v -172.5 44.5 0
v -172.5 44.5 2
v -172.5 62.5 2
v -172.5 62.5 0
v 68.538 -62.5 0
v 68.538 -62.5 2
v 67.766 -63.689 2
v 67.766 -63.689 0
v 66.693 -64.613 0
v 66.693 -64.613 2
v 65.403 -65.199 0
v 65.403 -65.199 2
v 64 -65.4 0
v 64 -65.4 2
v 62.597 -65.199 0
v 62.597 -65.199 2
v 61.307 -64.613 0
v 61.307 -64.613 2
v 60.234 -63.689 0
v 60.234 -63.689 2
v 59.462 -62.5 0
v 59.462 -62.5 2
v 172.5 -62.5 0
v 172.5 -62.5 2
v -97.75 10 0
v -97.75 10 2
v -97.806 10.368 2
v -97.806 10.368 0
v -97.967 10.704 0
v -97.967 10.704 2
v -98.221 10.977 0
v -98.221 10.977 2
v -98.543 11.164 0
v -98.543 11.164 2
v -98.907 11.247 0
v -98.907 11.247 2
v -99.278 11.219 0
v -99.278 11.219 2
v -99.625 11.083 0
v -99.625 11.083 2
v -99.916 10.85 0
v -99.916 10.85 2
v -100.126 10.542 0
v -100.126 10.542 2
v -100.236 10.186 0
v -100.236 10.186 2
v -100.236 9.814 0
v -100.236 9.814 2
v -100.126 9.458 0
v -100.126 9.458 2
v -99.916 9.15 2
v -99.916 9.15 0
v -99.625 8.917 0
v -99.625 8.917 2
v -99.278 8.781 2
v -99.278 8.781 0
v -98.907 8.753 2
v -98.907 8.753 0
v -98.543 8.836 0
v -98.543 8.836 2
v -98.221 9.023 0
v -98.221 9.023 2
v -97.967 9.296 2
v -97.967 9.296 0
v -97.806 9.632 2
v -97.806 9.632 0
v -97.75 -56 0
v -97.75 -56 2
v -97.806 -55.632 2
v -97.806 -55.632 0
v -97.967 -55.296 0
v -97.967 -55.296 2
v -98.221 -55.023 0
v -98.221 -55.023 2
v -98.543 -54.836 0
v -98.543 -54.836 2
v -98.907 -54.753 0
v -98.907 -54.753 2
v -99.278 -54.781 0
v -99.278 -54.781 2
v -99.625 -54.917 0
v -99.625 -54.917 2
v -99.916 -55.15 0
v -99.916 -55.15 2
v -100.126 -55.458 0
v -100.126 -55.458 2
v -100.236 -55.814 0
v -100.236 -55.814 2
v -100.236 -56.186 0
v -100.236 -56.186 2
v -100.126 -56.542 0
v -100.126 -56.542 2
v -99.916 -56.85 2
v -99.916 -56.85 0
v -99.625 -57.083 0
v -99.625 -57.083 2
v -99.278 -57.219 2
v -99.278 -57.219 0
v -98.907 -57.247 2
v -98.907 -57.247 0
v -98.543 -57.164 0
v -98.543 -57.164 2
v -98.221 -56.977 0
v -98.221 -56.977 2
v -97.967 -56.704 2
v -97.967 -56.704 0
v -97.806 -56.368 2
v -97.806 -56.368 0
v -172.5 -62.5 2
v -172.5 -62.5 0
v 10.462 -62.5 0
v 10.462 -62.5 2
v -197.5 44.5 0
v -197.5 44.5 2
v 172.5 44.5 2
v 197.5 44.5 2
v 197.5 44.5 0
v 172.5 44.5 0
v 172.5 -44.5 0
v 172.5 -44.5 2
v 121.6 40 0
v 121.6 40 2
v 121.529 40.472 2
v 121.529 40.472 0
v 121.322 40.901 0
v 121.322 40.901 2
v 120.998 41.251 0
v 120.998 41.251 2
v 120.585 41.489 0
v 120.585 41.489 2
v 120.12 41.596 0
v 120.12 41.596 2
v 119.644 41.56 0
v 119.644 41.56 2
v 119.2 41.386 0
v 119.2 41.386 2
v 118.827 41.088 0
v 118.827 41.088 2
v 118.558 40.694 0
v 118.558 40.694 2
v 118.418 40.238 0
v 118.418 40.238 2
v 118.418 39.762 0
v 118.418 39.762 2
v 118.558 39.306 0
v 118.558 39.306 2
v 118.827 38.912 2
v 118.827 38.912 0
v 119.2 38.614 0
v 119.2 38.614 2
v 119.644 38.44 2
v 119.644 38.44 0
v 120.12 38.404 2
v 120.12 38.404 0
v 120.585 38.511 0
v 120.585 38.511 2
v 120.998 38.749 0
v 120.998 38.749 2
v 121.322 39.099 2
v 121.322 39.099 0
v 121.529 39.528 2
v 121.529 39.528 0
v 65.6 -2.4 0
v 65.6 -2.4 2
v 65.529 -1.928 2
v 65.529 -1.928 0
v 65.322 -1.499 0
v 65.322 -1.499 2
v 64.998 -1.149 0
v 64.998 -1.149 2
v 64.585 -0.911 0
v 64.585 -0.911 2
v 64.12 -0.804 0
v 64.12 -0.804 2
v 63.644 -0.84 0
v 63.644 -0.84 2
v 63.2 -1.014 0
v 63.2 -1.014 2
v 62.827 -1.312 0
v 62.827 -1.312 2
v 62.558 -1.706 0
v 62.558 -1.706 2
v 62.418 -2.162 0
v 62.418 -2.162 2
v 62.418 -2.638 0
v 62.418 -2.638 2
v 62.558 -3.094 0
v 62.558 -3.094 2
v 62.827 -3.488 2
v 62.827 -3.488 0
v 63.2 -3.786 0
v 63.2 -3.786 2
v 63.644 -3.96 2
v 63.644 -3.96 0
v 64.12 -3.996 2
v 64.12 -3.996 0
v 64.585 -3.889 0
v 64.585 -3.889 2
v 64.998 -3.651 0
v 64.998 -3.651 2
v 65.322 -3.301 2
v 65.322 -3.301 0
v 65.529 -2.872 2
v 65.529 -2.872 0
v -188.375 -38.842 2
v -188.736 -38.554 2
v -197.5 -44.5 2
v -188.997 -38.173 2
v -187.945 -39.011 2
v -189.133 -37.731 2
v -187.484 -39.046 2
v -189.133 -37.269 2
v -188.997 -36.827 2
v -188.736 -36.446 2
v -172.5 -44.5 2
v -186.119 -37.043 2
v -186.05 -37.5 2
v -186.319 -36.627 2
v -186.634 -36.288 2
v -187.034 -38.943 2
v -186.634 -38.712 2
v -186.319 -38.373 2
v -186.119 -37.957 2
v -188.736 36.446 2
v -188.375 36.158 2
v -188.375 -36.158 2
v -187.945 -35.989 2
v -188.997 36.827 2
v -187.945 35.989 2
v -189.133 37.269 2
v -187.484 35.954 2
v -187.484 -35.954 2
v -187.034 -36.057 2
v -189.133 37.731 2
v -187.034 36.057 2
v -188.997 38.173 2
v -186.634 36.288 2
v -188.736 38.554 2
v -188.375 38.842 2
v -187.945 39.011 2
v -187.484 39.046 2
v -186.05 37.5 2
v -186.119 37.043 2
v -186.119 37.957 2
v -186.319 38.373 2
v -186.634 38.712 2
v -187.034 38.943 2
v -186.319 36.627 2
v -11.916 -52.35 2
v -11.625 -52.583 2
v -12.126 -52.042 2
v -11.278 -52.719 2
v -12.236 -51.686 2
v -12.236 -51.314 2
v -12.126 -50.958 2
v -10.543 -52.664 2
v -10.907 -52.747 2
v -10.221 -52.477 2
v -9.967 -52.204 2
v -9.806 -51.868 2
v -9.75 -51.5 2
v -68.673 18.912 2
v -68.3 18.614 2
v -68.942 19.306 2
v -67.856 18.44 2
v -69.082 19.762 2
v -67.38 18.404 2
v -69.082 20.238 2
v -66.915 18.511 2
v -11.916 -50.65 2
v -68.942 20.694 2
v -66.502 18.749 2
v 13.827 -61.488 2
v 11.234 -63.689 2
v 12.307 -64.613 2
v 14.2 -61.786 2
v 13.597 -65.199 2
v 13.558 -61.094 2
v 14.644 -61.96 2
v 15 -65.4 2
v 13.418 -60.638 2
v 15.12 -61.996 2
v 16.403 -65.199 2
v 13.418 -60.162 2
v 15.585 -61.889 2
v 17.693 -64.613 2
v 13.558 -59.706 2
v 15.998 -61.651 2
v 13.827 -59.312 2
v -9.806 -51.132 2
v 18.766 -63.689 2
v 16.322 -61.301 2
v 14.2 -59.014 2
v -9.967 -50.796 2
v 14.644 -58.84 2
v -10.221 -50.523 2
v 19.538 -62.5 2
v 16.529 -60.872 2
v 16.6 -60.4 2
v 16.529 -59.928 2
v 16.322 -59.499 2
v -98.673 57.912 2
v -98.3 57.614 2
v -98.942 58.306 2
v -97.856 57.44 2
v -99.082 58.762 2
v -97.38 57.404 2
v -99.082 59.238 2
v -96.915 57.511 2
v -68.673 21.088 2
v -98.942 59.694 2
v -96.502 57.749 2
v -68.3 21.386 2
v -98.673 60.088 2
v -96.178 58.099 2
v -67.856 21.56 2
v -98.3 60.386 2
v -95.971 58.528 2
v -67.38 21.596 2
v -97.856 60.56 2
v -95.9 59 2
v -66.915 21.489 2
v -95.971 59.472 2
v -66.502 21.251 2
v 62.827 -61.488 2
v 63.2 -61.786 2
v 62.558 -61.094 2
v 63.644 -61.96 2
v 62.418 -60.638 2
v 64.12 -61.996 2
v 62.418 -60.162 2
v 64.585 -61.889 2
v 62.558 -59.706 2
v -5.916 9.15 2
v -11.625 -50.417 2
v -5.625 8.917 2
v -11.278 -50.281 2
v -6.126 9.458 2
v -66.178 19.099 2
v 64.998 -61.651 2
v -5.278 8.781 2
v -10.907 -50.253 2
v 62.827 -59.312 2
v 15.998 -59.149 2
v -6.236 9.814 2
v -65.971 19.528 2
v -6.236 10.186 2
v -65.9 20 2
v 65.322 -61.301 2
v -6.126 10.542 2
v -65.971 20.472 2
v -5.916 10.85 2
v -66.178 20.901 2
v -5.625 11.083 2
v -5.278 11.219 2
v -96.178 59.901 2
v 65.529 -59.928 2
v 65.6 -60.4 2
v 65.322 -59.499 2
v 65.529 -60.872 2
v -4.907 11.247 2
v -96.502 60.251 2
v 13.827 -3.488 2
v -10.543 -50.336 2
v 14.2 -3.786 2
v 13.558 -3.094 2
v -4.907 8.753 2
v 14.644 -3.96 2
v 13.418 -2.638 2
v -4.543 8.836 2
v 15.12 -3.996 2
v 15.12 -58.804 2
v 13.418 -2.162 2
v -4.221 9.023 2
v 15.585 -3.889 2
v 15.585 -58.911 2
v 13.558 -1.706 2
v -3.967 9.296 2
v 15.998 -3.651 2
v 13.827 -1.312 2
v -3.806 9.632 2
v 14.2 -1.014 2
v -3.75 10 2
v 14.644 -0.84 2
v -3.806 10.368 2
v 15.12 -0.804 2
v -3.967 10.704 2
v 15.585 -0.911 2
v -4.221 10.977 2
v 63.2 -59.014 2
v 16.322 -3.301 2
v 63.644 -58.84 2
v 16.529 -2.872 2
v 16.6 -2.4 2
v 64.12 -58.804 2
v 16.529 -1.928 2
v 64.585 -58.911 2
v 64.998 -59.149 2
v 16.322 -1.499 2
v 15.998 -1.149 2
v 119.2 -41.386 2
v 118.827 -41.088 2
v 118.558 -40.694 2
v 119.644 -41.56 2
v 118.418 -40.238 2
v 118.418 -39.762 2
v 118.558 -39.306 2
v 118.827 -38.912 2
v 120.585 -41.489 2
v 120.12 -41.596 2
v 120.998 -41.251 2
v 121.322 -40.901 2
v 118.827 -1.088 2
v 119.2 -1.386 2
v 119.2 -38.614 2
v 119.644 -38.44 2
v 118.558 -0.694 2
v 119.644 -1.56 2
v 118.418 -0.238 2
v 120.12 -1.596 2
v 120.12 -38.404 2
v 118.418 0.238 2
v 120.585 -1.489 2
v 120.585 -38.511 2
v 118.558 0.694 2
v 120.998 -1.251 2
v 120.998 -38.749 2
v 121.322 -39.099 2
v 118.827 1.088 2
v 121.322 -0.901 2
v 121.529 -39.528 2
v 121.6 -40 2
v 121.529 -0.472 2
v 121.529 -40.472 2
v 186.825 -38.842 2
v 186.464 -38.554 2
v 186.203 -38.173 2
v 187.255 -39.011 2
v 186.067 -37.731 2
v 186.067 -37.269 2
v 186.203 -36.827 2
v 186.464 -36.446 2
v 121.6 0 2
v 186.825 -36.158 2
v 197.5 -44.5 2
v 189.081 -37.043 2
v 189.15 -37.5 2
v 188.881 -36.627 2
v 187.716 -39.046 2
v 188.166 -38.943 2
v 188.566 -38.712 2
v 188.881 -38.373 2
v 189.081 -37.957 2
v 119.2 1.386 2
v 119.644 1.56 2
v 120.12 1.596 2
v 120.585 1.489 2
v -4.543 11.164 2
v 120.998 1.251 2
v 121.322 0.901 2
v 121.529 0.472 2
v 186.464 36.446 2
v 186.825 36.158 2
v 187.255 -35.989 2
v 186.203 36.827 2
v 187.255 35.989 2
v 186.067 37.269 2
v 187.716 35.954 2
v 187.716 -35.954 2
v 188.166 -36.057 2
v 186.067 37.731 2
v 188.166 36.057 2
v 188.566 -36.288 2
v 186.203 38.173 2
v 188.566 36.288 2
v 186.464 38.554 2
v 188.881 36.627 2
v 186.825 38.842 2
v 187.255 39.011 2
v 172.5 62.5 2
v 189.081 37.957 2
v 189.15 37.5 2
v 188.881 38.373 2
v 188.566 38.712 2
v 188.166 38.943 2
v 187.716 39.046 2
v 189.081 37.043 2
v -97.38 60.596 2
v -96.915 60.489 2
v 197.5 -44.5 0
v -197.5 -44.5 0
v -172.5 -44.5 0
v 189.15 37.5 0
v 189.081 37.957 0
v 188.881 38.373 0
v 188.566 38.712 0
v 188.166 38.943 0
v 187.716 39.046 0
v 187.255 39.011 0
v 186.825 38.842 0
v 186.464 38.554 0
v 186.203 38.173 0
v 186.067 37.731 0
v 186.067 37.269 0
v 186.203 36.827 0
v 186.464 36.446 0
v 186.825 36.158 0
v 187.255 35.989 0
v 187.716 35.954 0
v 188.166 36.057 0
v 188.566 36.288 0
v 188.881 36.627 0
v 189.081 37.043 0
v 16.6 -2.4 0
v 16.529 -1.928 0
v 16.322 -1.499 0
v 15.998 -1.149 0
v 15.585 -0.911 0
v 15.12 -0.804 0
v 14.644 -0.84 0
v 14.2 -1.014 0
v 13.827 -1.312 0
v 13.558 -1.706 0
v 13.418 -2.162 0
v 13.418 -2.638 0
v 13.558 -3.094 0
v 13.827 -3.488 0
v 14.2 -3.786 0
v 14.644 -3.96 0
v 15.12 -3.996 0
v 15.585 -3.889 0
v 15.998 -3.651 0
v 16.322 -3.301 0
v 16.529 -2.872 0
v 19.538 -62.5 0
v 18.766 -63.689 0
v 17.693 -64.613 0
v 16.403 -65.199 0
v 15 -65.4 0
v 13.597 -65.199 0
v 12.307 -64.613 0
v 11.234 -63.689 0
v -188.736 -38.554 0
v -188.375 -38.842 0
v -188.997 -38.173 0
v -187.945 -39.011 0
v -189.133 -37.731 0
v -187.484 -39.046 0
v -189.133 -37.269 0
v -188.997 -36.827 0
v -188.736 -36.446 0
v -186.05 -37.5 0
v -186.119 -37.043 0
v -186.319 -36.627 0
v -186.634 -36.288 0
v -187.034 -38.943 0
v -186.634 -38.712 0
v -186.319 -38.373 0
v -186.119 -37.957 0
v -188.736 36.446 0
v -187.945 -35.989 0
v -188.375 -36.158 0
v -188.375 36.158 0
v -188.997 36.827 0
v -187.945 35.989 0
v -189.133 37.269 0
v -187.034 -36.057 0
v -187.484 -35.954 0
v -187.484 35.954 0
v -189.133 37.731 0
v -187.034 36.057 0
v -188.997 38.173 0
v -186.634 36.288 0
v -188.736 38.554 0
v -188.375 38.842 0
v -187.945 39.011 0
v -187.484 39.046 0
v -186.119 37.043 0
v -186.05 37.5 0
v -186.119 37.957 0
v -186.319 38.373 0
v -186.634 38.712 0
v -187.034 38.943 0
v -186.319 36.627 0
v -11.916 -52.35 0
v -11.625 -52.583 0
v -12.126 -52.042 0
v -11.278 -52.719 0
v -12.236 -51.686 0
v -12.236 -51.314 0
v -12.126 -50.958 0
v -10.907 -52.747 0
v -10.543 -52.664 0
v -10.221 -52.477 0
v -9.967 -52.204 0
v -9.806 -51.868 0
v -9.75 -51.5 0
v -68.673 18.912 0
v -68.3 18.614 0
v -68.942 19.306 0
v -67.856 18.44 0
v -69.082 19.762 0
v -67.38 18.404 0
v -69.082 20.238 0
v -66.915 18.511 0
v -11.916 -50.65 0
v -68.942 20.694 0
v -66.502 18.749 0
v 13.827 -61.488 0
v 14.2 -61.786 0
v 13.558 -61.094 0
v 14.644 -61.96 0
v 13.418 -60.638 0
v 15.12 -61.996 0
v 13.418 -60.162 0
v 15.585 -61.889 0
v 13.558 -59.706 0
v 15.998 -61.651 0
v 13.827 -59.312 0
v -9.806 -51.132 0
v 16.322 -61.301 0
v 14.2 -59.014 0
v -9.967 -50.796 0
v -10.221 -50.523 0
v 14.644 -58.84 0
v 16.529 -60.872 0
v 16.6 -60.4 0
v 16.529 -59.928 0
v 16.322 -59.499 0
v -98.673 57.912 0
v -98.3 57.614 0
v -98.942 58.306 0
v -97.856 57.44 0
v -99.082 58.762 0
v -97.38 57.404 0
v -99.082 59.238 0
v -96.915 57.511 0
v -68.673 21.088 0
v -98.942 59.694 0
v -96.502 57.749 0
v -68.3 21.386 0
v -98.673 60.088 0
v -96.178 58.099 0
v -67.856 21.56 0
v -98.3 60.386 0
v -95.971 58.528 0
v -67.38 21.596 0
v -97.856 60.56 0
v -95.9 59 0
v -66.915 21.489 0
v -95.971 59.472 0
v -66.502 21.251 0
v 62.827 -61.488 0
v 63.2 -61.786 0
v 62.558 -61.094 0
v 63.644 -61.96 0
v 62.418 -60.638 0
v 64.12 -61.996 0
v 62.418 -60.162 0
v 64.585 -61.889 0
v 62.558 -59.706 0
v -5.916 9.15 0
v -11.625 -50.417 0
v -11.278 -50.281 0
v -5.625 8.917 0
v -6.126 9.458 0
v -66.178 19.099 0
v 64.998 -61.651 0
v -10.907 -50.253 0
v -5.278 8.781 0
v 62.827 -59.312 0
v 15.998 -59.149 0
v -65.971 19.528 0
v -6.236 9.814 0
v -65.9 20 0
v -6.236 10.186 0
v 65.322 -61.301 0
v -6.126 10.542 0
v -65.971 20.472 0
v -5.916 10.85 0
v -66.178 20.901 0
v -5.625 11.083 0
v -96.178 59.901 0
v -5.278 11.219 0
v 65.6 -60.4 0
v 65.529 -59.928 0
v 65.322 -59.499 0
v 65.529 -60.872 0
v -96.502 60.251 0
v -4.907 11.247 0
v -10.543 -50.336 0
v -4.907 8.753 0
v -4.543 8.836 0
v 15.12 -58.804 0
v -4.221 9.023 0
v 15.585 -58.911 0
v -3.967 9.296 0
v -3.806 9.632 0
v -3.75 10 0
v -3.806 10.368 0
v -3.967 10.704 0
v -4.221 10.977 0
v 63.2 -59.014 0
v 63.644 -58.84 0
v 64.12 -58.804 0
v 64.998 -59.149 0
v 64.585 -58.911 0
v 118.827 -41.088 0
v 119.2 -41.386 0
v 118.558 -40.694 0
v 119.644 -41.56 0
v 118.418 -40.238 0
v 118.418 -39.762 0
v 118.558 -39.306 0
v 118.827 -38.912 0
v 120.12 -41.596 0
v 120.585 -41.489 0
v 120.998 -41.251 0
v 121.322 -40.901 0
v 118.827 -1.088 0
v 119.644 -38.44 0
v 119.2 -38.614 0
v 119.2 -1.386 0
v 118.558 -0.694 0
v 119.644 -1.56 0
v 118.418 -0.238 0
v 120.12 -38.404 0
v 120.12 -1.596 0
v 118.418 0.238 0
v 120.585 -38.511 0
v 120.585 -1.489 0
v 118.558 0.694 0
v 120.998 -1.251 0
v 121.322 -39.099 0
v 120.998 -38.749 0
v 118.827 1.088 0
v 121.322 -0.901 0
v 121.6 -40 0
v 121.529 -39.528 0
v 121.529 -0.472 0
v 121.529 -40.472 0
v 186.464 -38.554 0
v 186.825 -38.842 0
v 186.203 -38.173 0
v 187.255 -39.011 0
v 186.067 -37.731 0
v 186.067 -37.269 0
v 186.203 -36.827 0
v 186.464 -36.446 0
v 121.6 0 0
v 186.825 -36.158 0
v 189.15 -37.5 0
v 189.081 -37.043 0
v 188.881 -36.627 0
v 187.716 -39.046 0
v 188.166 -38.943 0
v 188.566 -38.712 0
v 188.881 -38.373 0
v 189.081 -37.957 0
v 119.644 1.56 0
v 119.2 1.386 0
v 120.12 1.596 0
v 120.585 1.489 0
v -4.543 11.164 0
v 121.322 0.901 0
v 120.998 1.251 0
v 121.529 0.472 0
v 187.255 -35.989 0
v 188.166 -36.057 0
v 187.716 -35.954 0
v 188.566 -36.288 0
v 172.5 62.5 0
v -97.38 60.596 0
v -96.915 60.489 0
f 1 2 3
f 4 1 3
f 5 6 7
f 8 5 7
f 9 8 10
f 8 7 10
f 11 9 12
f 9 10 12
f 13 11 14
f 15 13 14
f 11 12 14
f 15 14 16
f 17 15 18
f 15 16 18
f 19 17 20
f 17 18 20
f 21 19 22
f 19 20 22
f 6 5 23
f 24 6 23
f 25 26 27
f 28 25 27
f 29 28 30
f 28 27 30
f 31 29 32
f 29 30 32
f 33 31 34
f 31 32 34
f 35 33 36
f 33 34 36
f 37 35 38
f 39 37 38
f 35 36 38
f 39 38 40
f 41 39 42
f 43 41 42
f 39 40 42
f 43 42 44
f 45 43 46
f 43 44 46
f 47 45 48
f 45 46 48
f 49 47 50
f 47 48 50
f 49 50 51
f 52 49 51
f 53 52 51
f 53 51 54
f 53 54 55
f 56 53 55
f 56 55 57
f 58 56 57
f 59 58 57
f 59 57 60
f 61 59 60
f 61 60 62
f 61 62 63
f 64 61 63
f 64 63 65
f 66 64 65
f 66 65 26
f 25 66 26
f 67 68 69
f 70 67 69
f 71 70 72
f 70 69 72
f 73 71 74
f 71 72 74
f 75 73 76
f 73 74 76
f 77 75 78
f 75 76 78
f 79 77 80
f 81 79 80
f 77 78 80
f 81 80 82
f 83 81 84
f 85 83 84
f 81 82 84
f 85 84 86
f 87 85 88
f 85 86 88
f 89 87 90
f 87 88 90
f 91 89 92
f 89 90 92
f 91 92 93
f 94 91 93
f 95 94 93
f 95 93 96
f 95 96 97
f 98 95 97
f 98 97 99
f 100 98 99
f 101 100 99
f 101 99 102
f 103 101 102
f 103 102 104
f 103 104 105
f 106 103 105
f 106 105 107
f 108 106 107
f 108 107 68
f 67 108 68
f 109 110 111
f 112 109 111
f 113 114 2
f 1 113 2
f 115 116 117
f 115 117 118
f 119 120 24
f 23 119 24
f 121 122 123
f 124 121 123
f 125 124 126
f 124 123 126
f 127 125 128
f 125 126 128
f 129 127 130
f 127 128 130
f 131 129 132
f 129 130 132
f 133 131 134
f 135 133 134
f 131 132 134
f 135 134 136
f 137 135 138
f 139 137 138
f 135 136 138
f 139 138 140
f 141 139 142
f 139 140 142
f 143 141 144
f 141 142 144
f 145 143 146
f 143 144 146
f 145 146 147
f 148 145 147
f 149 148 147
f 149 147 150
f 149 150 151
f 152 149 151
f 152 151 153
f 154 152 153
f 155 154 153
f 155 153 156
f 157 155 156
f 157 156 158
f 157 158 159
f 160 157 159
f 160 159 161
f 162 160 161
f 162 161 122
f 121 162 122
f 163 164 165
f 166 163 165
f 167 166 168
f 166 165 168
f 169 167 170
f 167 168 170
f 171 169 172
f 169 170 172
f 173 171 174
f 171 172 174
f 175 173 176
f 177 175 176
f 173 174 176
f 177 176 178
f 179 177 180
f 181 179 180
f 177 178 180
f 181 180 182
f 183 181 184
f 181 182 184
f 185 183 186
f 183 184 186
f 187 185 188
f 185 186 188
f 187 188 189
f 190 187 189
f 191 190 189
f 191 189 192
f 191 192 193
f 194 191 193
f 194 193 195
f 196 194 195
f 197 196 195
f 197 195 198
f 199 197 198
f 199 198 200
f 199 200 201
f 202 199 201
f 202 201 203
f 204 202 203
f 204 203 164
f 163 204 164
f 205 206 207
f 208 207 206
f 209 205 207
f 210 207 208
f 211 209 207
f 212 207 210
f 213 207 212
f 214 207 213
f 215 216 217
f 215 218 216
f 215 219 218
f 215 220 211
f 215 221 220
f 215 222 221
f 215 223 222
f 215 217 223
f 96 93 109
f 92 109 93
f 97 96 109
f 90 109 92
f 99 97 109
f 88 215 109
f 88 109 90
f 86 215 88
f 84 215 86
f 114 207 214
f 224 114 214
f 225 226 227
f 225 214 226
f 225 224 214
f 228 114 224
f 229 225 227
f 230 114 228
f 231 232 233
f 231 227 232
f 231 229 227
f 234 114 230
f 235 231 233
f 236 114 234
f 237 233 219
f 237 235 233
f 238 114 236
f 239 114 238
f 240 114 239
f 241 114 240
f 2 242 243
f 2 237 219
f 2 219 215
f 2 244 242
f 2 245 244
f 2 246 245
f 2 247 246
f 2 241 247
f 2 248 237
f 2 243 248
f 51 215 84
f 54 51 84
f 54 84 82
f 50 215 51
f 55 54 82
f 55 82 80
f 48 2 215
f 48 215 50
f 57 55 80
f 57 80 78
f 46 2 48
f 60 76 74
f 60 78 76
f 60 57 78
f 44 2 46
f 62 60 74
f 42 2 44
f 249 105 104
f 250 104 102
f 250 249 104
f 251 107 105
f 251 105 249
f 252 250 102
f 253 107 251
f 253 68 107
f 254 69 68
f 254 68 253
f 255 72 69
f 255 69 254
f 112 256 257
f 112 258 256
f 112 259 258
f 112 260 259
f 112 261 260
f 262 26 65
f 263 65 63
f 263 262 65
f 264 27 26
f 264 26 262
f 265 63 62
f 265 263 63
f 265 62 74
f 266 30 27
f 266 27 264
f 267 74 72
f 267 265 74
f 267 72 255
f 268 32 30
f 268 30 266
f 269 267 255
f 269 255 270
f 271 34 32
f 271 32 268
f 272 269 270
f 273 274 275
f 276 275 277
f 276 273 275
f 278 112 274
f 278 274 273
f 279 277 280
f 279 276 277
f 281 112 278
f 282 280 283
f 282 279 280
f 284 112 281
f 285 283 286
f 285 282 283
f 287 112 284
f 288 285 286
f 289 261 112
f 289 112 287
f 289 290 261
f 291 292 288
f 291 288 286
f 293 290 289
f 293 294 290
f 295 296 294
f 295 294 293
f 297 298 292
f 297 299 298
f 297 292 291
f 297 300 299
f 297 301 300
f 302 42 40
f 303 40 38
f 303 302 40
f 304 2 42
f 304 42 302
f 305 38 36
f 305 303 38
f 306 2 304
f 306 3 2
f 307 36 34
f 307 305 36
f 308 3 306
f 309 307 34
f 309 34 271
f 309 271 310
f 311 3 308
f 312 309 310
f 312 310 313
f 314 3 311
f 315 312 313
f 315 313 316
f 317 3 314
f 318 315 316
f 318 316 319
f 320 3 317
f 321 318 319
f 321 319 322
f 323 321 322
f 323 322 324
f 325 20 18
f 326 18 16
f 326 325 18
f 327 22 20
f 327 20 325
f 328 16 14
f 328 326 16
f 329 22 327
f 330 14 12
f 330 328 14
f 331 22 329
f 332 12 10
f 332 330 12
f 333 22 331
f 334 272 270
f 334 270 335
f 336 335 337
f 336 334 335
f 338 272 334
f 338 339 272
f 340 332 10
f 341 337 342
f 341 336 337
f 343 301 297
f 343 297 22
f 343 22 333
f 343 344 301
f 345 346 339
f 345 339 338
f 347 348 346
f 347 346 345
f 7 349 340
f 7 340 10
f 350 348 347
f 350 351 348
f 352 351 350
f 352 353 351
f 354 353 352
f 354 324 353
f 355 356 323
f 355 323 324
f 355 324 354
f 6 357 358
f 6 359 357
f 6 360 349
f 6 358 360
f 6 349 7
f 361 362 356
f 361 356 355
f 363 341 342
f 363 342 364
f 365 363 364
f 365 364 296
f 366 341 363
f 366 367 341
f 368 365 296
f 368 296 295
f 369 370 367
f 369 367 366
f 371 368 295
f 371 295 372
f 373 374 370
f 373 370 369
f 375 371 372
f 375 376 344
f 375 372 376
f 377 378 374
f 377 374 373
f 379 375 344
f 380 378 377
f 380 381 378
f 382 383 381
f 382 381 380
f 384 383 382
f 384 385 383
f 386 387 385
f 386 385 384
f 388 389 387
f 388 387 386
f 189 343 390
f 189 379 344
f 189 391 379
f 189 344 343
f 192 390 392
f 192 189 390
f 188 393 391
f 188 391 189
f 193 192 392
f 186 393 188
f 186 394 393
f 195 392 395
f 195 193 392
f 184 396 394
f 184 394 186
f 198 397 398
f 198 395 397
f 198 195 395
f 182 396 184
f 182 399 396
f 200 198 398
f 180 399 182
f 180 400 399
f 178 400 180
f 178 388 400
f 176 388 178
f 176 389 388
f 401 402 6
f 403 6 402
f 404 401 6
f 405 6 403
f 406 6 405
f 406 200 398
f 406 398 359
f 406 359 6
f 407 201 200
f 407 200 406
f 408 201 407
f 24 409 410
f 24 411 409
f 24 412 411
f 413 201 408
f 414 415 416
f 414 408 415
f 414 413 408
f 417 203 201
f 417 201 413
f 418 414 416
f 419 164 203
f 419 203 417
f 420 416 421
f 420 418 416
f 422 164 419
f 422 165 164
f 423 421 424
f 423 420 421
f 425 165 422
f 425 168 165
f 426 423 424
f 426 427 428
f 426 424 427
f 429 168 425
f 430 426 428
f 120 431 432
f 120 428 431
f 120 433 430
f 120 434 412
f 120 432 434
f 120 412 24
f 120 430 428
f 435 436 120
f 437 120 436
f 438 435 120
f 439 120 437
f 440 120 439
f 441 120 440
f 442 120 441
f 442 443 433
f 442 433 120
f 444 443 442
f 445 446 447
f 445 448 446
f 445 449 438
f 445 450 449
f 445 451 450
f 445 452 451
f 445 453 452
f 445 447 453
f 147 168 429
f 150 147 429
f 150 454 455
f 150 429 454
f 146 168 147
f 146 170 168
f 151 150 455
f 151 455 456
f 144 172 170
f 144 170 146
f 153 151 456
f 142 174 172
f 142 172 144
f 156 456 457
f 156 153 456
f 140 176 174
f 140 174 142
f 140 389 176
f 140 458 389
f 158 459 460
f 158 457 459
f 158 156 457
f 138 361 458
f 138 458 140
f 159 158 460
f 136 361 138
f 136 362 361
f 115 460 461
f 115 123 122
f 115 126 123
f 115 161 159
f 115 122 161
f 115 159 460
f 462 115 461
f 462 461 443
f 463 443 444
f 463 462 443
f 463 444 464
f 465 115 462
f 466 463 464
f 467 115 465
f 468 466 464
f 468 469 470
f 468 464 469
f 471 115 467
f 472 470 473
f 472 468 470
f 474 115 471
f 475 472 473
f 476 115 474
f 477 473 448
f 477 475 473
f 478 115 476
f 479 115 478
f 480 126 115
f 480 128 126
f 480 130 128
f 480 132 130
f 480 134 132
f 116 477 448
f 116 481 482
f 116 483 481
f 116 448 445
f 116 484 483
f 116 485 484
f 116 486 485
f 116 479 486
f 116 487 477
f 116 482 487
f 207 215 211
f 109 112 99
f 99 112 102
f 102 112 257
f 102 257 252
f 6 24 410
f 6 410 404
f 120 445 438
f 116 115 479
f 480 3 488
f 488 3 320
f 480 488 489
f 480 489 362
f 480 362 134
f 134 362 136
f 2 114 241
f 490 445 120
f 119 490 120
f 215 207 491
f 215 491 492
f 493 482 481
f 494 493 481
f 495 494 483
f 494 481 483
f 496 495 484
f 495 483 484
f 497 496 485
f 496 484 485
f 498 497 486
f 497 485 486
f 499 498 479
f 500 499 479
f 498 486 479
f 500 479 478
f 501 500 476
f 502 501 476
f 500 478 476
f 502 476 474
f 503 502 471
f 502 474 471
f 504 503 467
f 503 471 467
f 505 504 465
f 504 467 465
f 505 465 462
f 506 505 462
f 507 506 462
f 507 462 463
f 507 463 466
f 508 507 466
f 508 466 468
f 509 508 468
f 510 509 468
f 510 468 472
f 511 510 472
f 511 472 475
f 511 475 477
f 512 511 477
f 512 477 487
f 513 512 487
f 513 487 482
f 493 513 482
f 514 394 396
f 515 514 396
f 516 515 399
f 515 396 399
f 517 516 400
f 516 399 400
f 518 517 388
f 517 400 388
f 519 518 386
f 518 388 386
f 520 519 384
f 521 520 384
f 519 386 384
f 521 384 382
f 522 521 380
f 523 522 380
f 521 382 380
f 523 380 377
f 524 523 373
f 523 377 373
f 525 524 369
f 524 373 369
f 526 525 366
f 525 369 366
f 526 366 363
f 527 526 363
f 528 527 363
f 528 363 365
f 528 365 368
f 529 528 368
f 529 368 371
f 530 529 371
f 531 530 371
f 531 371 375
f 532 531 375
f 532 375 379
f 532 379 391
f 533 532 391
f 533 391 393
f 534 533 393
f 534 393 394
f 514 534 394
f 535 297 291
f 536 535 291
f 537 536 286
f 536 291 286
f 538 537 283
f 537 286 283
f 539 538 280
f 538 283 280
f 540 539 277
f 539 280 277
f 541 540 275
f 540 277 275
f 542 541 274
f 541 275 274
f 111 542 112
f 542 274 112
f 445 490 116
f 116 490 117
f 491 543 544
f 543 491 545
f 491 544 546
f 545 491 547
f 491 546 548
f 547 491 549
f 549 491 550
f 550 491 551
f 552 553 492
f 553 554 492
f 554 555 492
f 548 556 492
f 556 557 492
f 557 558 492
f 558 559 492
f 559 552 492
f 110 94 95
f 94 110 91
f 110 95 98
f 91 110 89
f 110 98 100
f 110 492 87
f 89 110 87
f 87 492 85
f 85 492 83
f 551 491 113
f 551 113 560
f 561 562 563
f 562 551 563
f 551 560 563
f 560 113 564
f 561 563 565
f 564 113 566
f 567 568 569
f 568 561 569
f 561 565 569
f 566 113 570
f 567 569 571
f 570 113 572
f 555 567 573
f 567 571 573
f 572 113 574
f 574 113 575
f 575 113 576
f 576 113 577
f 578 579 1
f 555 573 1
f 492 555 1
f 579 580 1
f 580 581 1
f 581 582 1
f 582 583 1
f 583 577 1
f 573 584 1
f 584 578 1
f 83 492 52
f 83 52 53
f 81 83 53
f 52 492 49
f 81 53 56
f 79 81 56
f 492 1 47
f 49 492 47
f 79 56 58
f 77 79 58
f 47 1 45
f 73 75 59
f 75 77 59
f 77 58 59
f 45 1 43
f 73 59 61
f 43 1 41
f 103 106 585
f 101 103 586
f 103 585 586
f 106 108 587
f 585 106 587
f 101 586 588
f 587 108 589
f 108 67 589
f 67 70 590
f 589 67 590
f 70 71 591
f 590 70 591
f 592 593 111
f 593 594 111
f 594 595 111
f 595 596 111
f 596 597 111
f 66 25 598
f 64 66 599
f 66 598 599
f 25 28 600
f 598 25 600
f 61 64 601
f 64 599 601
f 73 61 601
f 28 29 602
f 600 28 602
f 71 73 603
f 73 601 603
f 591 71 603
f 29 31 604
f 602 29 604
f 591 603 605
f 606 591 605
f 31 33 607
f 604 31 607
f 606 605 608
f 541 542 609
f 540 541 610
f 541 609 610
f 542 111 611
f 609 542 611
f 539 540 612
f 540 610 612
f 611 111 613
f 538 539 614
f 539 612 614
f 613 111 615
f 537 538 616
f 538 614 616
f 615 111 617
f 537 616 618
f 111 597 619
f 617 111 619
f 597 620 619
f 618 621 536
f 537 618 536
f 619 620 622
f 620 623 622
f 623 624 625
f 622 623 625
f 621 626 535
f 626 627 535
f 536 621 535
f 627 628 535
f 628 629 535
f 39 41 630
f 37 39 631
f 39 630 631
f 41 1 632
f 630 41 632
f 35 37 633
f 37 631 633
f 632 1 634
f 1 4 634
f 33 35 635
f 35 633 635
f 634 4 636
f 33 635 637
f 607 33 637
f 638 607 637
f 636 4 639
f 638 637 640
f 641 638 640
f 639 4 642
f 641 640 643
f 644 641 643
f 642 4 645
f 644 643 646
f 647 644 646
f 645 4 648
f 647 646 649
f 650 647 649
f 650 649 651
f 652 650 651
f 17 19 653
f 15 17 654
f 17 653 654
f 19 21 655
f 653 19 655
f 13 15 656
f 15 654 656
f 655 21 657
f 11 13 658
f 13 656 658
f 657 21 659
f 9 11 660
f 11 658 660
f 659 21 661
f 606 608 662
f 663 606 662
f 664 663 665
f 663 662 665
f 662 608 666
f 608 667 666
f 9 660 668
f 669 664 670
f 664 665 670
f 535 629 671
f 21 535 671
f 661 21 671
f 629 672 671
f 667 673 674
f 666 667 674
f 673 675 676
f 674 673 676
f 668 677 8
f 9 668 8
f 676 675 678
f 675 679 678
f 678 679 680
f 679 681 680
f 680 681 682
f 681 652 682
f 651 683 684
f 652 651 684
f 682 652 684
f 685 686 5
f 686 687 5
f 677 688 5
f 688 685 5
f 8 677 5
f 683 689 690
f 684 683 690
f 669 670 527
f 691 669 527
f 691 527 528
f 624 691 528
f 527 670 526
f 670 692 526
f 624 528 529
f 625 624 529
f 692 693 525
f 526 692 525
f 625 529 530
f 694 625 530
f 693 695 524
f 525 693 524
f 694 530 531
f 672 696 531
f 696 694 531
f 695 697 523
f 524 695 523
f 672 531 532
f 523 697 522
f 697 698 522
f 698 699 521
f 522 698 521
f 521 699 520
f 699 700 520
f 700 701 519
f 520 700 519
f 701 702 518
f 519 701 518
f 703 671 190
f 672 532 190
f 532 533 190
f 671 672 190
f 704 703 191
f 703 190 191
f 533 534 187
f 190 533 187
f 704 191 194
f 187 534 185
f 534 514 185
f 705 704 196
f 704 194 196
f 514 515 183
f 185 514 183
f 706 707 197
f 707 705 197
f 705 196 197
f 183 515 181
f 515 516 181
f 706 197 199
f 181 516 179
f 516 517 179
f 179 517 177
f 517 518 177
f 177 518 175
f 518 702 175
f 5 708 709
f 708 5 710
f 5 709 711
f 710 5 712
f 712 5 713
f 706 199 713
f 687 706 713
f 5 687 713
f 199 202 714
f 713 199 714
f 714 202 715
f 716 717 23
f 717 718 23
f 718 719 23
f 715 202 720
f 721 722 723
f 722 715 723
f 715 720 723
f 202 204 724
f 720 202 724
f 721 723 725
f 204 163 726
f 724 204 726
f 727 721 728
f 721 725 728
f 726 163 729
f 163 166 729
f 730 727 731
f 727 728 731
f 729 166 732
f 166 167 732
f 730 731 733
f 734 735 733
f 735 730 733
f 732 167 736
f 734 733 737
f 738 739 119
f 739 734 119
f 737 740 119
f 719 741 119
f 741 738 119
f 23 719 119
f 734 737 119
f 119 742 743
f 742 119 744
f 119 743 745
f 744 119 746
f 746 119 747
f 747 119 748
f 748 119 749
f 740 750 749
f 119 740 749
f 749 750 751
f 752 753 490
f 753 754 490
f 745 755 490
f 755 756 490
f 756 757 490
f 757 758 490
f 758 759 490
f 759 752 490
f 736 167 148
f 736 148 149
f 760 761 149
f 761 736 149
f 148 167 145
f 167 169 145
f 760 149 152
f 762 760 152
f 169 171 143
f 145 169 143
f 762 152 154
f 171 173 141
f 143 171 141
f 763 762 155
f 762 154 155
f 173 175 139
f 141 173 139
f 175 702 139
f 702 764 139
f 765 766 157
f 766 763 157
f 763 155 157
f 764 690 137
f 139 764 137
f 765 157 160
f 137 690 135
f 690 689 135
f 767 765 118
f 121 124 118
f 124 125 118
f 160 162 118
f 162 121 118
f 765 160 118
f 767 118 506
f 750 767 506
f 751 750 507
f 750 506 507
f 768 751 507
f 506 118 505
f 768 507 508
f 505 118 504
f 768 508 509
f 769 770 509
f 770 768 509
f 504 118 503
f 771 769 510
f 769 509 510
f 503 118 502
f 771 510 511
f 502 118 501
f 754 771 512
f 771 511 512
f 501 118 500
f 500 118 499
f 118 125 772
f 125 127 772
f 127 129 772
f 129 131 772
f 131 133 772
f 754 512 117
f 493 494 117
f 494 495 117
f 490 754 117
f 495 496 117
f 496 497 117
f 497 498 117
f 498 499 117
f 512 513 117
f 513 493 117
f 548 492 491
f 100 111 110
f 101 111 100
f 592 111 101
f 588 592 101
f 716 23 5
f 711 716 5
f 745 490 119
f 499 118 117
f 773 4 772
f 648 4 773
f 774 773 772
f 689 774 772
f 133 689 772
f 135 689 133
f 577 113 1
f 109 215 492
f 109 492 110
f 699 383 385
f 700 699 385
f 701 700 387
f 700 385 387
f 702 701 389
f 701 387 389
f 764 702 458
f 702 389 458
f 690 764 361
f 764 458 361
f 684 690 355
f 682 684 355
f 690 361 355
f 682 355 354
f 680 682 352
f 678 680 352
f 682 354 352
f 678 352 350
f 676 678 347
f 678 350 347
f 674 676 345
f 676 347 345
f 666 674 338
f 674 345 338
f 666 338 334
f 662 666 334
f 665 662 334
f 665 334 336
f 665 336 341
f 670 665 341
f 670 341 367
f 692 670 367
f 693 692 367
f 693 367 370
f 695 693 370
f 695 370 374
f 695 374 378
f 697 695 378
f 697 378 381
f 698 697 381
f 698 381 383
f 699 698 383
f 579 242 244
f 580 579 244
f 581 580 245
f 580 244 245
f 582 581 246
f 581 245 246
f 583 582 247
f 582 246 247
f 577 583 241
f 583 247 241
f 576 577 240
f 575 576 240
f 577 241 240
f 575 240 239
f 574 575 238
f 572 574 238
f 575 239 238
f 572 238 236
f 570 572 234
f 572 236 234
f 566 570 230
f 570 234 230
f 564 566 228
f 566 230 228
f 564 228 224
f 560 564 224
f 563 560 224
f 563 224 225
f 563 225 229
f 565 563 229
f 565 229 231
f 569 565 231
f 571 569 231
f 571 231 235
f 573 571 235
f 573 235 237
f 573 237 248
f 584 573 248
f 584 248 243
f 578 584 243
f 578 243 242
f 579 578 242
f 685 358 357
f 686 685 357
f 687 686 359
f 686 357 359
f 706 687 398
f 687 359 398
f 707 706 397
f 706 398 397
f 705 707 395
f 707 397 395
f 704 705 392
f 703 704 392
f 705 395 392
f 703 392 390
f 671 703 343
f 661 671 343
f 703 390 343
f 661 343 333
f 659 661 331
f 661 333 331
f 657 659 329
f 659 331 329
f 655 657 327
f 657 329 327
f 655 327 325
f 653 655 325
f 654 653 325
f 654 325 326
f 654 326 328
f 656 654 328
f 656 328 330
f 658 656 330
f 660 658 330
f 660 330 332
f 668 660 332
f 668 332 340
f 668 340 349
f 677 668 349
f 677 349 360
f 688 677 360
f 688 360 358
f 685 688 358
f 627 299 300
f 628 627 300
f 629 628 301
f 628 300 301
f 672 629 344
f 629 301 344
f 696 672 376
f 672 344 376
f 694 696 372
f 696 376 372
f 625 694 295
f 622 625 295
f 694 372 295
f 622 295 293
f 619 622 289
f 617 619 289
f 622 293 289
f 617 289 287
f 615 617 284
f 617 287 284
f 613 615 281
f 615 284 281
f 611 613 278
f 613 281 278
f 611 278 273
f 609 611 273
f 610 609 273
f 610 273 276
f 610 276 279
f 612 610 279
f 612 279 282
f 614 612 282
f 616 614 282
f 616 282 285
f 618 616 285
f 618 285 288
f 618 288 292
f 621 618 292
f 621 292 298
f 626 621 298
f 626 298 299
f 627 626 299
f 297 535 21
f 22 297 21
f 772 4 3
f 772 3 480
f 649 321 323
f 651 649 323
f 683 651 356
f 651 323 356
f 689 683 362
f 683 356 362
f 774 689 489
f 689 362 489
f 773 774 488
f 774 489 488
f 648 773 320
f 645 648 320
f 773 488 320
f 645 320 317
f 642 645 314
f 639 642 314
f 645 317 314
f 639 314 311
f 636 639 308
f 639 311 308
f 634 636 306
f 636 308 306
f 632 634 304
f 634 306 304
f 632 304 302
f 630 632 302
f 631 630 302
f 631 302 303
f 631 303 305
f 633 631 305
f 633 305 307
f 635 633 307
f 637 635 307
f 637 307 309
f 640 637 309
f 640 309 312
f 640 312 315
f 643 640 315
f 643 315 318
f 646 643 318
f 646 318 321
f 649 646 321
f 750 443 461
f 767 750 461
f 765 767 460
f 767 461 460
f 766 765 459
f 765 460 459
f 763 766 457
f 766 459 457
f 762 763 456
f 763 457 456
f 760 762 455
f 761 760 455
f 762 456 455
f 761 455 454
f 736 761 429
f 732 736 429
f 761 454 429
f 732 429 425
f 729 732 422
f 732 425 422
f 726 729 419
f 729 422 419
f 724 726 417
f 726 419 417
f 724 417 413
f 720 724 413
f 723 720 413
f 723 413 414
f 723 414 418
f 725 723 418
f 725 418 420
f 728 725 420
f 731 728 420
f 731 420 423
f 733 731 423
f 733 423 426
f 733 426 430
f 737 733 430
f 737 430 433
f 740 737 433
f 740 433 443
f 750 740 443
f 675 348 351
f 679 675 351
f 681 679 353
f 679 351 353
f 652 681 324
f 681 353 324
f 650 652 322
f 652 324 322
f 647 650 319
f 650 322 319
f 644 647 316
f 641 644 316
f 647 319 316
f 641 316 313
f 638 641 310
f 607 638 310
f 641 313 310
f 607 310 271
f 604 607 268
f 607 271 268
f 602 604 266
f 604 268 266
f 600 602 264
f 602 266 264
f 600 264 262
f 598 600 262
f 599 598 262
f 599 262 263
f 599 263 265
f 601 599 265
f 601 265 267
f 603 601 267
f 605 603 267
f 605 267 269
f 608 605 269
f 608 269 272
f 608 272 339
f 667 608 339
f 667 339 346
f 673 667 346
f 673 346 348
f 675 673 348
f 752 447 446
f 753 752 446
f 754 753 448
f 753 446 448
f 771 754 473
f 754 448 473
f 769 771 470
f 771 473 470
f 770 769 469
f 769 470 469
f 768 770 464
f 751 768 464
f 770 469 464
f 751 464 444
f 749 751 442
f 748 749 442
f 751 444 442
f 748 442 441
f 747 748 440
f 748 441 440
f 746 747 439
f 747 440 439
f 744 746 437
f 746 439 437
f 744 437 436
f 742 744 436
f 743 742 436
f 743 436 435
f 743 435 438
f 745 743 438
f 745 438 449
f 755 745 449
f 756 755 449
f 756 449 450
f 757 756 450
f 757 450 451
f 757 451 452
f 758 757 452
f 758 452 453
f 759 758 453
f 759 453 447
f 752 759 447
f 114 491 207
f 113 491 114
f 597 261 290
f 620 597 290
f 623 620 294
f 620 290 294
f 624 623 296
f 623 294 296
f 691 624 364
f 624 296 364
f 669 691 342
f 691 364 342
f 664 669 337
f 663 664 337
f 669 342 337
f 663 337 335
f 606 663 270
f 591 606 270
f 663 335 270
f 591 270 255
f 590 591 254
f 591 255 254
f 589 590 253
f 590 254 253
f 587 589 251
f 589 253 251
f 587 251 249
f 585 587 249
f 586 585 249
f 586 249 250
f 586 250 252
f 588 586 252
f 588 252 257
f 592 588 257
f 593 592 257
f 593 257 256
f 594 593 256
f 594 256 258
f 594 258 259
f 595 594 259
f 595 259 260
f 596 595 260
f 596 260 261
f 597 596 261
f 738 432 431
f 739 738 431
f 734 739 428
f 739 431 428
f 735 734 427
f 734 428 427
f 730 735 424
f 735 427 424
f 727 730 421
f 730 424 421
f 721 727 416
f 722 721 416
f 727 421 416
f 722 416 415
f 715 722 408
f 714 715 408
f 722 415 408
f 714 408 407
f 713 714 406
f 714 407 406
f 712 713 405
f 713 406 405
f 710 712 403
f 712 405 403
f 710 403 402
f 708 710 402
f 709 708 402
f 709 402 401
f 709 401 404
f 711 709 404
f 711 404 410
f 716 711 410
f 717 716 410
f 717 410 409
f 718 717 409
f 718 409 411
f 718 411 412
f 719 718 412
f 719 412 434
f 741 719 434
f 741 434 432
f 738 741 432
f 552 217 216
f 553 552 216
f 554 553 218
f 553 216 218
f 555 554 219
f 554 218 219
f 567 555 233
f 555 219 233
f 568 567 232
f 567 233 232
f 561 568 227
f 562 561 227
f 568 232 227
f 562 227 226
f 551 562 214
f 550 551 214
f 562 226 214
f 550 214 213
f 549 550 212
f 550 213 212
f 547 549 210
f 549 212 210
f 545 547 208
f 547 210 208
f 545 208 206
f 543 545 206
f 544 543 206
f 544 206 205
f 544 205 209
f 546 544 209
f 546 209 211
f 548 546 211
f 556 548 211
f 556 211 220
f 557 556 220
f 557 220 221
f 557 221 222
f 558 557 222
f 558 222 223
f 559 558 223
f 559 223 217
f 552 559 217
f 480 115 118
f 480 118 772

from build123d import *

# Parameters (mm, degrees)
SKETCH1_W               = 395
SKETCH1_H               = 125
BOSS_EXTRUDE1_DEPTH     = 2
SKETCH2_R               = 1.55
FIXING_HOLES_DEPTH      = 208.162979318
SKETCH3_W               = 25
SKETCH3_H               = 18
CUT_EXTRUDE2_DEPTH      = 208.162979318
MIRROR2_COPY_1_SKETCH_W = 25
MIRROR2_COPY_1_SKETCH_H = 18
MIRROR2_COPY_1_DEPTH    = 208.162979318
SKETCH4_R               = 1.25
CAVE_BOARD_HOLES_DEPTH  = 208.162979318
SKETCH5_R               = 1.6
RPI_HOLES_DEPTH         = 208.162979318
SKETCH6_R               = 1.6
BUZZER_HOLES_DEPTH      = 208.162979318
SKETCH7_R               = 1.6
RELAYS_HOLES_DEPTH      = 208.162979318
BOSS_EXTRUDE2_DEPTH     = 2


with BuildPart() as part:
    # Sketch1 → Boss-Extrude1 (new body)
    with BuildSketch(Plane.XY):
        Rectangle(SKETCH1_W, SKETCH1_H)
    extrude(amount=BOSS_EXTRUDE1_DEPTH)

    # Sketch2 → Fixing_holes (cut, through all)
    with BuildSketch(Plane.XY.offset(2)):
        with Locations((-187.6, 37.5)):
            Circle(SKETCH2_R)
        with Locations((-187.6, -37.5)):
            Circle(SKETCH2_R)
        with Locations((187.6, 37.5)):
            Circle(SKETCH2_R)
        with Locations((187.6, -37.5)):
            Circle(SKETCH2_R)
    extrude(amount=-FIXING_HOLES_DEPTH, mode=Mode.SUBTRACT)

    # Sketch3 → Cut-Extrude2 (cut, through all)
    with BuildSketch(Plane.XY.offset(2)):
        with Locations((-185, 53.5)):
            Rectangle(SKETCH3_W, SKETCH3_H)
    cut_extrude2 = extrude(amount=-CUT_EXTRUDE2_DEPTH, mode=Mode.SUBTRACT)

    # Mirror1: Cut-Extrude2 across plane
    add(cut_extrude2.mirror(Plane.ZX), mode=Mode.SUBTRACT)

    # Mirror2: Cut-Extrude2 across plane
    add(cut_extrude2.mirror(Plane(origin=(0, 0, 0), x_dir=(0, 0, 1), z_dir=(1, 0, 0))), mode=Mode.SUBTRACT)

    # Mirror2 copy 1 sketch → Mirror2 copy 1 (cut, through all)
    with BuildSketch(Plane(origin=(0, 0, 2), x_dir=(-1, 0, 0), z_dir=(0, 0, 1))):
        with Locations((-185, 53.5)):
            Rectangle(MIRROR2_COPY_1_SKETCH_W, MIRROR2_COPY_1_SKETCH_H)
    extrude(amount=-MIRROR2_COPY_1_DEPTH, mode=Mode.SUBTRACT)

    # Sketch4 → Cave_board_holes (cut, through all)
    with BuildSketch(Plane.XY.offset(2)):
        with Locations((-99, 10)):
            Circle(SKETCH4_R)
        with Locations((-99, -56)):
            Circle(SKETCH4_R)
        with Locations((-5, 10)):
            Circle(SKETCH4_R)
        with Locations((-11, -51.5)):
            Circle(SKETCH4_R)
    extrude(amount=-CAVE_BOARD_HOLES_DEPTH, mode=Mode.SUBTRACT)

    # Sketch5 → RPi_holes (cut, through all)
    with BuildSketch(Plane.XY.offset(2)):
        with Locations((15, -2.4)):
            Circle(SKETCH5_R)
        with Locations((15, -60.4)):
            Circle(SKETCH5_R)
        with Locations((64, -2.4)):
            Circle(SKETCH5_R)
        with Locations((64, -60.4)):
            Circle(SKETCH5_R)
    extrude(amount=-RPI_HOLES_DEPTH, mode=Mode.SUBTRACT)

    # Sketch6 → buzzer_holes (cut, through all)
    with BuildSketch(Plane.XY.offset(2)):
        with Locations((-97.5, 59)):
            Circle(SKETCH6_R)
        with Locations((-67.5, 20)):
            Circle(SKETCH6_R)
    extrude(amount=-BUZZER_HOLES_DEPTH, mode=Mode.SUBTRACT)

    # Sketch7 → relays_holes (cut, through all)
    with BuildSketch(Plane.XY.offset(2)):
        with Locations((120, 0)):
            Circle(SKETCH7_R)
        with Locations((120, 40)):
            Circle(SKETCH7_R)
        with Locations((120, -40)):
            Circle(SKETCH7_R)
    extrude(amount=-RELAYS_HOLES_DEPTH, mode=Mode.SUBTRACT)

    # Sketch8 → Boss-Extrude2 (add)
    with BuildSketch(Plane.XY.offset(2)):
        with BuildLine():
            Line((10.462379478, -62.5), (19.537620522, -62.5))
            ThreePointArc((19.537620522, -62.5), (15, -65.4), (10.462379478, -62.5))
        make_face()
        with BuildLine():
            Line((59.462379478, -62.5), (68.537620522, -62.5))
            ThreePointArc((68.537620522, -62.5), (64, -65.4), (59.462379478, -62.5))
        make_face()
    extrude(amount=-BOSS_EXTRUDE2_DEPTH)


solid = part.part
